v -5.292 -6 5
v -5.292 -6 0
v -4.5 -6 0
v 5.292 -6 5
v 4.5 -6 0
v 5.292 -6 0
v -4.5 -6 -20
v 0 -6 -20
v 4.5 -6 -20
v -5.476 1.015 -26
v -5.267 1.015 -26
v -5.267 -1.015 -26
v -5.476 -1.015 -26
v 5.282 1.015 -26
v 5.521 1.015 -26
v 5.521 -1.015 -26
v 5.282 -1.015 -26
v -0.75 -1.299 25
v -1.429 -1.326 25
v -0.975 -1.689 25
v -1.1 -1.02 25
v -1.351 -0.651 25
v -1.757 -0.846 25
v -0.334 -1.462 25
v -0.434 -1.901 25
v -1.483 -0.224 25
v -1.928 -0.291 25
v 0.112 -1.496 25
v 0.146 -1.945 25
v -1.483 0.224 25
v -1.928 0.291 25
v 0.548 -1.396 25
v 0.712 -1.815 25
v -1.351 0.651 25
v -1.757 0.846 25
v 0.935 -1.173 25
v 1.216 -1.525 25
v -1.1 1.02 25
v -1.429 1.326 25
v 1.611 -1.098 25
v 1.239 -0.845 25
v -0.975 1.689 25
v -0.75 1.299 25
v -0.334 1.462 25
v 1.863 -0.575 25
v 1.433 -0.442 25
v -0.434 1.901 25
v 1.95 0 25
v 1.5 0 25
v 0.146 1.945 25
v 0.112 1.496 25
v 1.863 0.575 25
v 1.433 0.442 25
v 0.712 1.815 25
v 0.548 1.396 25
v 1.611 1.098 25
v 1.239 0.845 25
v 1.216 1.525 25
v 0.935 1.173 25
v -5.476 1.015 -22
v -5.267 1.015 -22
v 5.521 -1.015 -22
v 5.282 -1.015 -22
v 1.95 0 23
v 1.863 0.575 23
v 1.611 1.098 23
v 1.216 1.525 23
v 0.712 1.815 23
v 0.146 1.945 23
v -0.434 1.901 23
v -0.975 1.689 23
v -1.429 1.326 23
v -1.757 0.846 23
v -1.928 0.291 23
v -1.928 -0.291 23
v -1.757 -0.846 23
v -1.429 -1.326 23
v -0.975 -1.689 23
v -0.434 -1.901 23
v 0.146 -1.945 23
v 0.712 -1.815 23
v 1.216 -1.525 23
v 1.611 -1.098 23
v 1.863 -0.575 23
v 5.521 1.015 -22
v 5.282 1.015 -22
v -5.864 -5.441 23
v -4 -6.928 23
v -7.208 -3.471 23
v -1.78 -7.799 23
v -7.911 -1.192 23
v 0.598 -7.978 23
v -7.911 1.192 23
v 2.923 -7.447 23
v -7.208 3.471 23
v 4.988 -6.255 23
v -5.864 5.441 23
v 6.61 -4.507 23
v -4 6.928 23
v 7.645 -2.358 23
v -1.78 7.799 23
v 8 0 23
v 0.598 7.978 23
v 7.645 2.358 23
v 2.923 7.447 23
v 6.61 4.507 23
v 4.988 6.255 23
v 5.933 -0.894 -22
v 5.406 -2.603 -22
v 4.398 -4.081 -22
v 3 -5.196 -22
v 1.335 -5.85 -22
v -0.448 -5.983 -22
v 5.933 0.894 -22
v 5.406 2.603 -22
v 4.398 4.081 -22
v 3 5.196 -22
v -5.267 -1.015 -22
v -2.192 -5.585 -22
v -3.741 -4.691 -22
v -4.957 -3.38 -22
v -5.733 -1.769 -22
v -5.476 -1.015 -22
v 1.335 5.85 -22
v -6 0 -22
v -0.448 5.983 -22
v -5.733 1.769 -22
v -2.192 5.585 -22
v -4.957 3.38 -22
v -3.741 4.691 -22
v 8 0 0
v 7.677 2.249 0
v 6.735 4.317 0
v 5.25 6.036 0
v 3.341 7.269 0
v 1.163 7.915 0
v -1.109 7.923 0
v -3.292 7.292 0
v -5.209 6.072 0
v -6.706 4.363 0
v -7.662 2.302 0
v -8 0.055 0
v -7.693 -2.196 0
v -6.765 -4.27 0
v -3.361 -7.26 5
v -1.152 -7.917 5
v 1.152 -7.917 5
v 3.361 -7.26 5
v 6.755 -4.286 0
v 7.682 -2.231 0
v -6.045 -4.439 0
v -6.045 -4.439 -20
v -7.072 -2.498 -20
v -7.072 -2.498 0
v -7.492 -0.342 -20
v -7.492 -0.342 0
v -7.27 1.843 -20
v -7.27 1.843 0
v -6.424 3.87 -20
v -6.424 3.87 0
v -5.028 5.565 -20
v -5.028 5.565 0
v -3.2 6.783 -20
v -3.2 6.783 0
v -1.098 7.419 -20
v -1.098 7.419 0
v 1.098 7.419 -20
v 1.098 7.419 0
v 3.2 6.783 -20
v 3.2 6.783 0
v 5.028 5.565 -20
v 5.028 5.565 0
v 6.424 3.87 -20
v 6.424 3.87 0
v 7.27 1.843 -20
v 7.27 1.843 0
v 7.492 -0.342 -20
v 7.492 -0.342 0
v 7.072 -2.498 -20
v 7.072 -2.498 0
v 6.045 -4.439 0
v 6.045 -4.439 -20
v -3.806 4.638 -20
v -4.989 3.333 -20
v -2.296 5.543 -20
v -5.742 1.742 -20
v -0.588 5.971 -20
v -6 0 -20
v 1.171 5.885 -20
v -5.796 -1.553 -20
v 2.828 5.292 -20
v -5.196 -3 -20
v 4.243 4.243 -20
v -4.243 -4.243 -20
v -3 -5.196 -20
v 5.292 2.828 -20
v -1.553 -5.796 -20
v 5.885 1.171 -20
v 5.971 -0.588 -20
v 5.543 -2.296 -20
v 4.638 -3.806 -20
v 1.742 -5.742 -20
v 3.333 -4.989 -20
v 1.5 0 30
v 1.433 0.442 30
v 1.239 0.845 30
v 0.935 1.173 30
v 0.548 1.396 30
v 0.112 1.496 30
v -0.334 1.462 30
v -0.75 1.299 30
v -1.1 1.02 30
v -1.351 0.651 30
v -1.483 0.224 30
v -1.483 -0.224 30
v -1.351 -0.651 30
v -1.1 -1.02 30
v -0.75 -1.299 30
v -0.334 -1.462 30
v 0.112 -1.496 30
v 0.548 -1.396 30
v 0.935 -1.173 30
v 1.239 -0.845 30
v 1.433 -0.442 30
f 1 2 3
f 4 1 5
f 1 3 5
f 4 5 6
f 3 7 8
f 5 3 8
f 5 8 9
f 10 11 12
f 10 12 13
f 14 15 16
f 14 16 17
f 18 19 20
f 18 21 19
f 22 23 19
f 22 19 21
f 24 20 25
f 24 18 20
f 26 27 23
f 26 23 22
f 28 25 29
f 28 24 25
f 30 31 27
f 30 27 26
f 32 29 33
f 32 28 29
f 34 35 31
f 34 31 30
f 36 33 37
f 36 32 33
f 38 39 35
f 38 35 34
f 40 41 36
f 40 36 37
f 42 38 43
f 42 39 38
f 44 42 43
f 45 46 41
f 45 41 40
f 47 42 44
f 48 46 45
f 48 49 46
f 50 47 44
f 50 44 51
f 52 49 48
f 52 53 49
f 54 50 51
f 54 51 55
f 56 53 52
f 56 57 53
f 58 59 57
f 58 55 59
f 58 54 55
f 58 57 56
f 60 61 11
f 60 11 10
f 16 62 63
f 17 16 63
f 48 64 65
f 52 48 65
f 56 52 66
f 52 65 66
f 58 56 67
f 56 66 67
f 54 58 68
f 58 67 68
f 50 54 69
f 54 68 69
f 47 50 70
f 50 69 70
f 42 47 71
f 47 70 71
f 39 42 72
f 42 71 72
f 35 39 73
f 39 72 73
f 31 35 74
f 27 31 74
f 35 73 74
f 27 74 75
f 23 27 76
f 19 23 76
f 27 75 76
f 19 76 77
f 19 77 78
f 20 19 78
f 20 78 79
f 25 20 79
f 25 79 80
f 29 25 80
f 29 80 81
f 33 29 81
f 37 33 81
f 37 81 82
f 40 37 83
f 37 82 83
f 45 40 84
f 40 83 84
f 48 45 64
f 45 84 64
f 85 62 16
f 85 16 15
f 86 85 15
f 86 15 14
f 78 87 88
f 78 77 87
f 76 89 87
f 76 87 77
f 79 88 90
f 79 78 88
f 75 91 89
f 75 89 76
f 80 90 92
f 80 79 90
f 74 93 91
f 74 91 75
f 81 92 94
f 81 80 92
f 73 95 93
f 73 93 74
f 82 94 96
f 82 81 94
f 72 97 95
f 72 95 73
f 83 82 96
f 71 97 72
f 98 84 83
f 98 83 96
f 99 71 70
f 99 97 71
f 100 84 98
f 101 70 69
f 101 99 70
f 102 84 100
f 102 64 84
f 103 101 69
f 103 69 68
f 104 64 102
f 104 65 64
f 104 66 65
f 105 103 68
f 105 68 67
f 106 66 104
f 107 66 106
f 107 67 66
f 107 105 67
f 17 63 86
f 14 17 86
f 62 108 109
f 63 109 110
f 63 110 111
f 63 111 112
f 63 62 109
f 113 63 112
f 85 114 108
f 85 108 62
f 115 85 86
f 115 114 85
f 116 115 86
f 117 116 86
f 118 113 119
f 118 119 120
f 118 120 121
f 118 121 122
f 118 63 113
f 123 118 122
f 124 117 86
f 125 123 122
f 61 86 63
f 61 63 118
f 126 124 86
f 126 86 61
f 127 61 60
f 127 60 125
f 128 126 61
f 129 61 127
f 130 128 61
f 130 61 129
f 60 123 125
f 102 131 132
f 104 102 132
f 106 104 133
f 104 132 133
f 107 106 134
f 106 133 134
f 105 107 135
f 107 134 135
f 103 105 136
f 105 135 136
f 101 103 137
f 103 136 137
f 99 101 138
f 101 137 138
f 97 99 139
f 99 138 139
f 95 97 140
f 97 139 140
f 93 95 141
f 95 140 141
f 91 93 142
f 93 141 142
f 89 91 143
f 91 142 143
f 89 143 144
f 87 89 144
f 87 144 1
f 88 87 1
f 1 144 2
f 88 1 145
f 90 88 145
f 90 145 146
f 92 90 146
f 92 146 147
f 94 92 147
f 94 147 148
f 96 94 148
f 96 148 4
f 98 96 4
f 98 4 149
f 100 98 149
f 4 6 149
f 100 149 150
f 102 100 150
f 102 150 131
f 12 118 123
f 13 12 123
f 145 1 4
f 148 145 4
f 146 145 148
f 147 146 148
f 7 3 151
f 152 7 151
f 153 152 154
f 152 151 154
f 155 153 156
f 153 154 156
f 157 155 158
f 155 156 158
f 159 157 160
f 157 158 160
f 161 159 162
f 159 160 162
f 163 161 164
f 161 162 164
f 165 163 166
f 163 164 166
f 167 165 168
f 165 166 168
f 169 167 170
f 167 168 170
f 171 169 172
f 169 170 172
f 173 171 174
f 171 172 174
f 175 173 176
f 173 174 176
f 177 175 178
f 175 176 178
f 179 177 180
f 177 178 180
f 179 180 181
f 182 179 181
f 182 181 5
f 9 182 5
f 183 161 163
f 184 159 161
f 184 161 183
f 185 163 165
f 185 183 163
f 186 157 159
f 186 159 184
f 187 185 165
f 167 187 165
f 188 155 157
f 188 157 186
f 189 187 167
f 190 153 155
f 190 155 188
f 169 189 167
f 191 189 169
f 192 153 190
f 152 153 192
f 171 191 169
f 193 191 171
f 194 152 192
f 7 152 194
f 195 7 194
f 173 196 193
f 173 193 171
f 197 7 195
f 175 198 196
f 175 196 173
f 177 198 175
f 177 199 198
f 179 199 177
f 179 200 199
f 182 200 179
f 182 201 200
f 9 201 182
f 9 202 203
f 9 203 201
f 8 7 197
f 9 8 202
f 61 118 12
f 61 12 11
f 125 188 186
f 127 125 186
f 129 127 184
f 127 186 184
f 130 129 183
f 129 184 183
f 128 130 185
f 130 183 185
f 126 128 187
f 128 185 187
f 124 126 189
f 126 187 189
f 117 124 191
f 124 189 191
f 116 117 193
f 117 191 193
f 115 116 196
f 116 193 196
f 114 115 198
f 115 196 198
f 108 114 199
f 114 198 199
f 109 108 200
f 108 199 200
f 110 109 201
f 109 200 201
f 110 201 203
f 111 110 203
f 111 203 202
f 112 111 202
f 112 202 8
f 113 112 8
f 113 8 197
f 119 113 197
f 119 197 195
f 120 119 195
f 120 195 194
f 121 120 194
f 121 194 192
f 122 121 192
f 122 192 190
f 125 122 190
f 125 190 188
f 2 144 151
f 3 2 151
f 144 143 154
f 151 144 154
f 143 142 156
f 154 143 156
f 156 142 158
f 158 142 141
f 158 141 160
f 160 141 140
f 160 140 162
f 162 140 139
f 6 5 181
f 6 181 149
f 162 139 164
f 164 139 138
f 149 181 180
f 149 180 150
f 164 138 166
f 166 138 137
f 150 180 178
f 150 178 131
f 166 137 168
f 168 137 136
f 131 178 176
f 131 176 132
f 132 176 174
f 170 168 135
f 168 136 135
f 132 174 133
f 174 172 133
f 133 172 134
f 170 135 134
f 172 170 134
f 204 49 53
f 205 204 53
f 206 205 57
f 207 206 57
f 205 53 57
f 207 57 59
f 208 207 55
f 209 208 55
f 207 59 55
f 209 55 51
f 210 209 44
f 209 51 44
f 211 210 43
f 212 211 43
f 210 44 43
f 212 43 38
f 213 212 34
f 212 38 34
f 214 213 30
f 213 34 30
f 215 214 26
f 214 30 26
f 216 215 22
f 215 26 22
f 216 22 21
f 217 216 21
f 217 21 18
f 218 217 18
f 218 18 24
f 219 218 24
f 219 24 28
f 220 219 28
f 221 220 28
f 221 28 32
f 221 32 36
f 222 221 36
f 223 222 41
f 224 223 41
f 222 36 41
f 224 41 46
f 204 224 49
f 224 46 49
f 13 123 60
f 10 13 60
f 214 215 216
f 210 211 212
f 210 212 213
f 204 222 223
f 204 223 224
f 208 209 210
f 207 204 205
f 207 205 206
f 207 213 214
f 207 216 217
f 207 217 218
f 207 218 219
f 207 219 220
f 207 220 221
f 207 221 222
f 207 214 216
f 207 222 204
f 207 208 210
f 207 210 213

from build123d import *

# Parameters (mm, degrees)
SKETCH_1_R          = 8
EXTRUDE_1_DEPTH     = 23
SKETCH_2_R          = 6
EXTRUDE_2_DEPTH     = 22
SKETCH_4_R          = 1.95
EXTRUDE_4_DEPTH     = 2
SKETCH_5_R          = 7.5
EXTRUDE_6_DEPTH     = 20
CUT_EXTRUDE_2_DEPTH = 25
SKETCH_7_W          = 0.238746812
SKETCH_7_H          = 2.029347906
SKETCH_7_W_2        = 0.208903461
EXTRUDE_7_DEPTH     = 4
SKETCH_8_R          = 1.5
EXTRUDE_8_DEPTH     = 5


with BuildPart() as part:
    # 草图1 → 凸台-拉伸1 (new body)
    with BuildSketch(Plane.XY):
        Circle(SKETCH_1_R)
    extrude(amount=EXTRUDE_1_DEPTH)

    # 草图2 → 凸台-拉伸2 (add)
    with BuildSketch(Plane(origin=(0, 0, 0), x_dir=(-1, 0, 0), z_dir=(0, 0, -1))):
        Circle(SKETCH_2_R)
    extrude(amount=EXTRUDE_2_DEPTH)

    # 草图4 → 凸台-拉伸4 (add)
    with BuildSketch(Plane.XY.offset(23)):
        Circle(SKETCH_4_R)
    extrude(amount=EXTRUDE_4_DEPTH)

    # 草图5 → 凸台-拉伸6 (add)
    with BuildSketch(Plane(origin=(0, 0, 0), x_dir=(-1, 0, 0), z_dir=(0, 0, -1))):
        with Locations(Location((0, 0, 0), (0, 0, 180))):
            Circle(SKETCH_5_R)
    extrude(amount=EXTRUDE_6_DEPTH)

    # 草图6 → 切除-拉伸2 (cut)
    with BuildSketch(Plane(origin=(0, 0, -20), x_dir=(-1, 0, 0), z_dir=(0, 0, -1))):
        Polygon((0, -6), (7.251934426, -6), (7.251934426, -9), (-7.072874317, -9), (-7.072874317, -6), align=None)
    extrude(amount=-CUT_EXTRUDE_2_DEPTH, mode=Mode.SUBTRACT)

    # 草图7 → 凸台-拉伸7 (add)
    with BuildSketch(Plane(origin=(0, 0, -22), x_dir=(-1, 0, 0), z_dir=(0, 0, -1))):
        with Locations((-5.40164663, 0)):
            Rectangle(SKETCH_7_W, SKETCH_7_H)
        with Locations((5.371803278, 0)):
            Rectangle(SKETCH_7_W_2, SKETCH_7_H)
    extrude(amount=EXTRUDE_7_DEPTH)

    # 草图8 → 凸台-拉伸8 (add)
    with BuildSketch(Plane.XY.offset(25)):
        Circle(SKETCH_8_R)
    extrude(amount=EXTRUDE_8_DEPTH)


solid = part.part
